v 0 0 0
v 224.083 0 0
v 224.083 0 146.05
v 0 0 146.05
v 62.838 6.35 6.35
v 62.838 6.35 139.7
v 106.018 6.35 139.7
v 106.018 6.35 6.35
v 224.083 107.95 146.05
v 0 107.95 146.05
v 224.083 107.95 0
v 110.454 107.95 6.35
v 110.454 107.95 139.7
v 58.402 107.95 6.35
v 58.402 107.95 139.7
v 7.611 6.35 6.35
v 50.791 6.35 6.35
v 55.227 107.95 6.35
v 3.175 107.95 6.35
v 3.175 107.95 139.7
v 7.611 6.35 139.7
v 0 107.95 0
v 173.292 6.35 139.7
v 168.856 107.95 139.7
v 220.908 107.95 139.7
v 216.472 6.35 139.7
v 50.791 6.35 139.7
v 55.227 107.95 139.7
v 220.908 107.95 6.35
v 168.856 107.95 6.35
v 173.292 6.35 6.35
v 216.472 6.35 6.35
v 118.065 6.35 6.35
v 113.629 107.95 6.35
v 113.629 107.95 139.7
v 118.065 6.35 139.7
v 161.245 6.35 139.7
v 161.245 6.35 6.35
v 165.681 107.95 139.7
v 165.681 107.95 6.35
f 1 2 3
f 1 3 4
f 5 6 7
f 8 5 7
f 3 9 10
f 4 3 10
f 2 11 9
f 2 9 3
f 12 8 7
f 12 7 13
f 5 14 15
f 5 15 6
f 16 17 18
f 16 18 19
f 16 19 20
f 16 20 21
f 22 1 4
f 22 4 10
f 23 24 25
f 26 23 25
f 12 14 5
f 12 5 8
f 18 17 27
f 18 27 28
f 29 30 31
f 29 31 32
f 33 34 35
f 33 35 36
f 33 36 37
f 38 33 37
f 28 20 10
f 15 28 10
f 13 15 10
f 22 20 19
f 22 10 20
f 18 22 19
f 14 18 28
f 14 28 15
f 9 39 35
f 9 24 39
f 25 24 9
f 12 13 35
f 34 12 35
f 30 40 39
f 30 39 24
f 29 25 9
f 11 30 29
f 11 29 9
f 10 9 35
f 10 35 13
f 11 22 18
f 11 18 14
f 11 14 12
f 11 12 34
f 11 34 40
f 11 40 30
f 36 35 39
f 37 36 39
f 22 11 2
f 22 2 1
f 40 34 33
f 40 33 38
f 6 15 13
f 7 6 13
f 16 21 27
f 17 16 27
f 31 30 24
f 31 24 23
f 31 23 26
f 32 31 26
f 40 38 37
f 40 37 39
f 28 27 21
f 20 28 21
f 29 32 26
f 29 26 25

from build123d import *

# Parameters (mm, degrees)
BOSS_EXTRUDE1_DEPTH = 146.05
BOSS_EXTRUDE2_DEPTH = 6.35


with BuildPart() as part:
    # Sketch1 → Boss-Extrude1 (new body)
    with BuildSketch(Plane.XY):
        Polygon((0, 0), (0, 107.95), (3.175, 107.95), (7.6109518, 6.35), (50.7909518, 6.35), (55.226903599, 107.95), (58.401903599, 107.95), (62.837855399, 6.35), (106.017855399, 6.35), (110.453807198, 107.95), (113.628807198, 107.95), (118.064758998, 6.35), (161.244758998, 6.35), (165.680710797, 107.95), (168.855710797, 107.95), (173.291662597, 6.35), (216.471662597, 6.35), (220.907614396, 107.95), (224.082614396, 107.95), (224.082614396, 0), align=None)
    extrude(amount=BOSS_EXTRUDE1_DEPTH)

    # Sketch2 → Boss-Extrude2 (add)
    with BuildSketch(Plane.XY.offset(146.05)):
        Polygon((3.175, 107.95), (55.226903599, 107.95), (50.7909518, 6.35), (7.6109518, 6.35), align=None)
        Polygon((58.401903599, 107.95), (62.837855399, 6.35), (106.017855399, 6.35), (110.453807198, 107.95), align=None)
        Polygon((113.628807198, 107.95), (118.064758998, 6.35), (161.244758998, 6.35), (165.680710797, 107.95), align=None)
        Polygon((168.855710797, 107.95), (173.291662597, 6.35), (216.471662597, 6.35), (220.907614396, 107.95), align=None)
    boss_extrude2 = extrude(amount=-BOSS_EXTRUDE2_DEPTH)

    # Mirror1: Boss-Extrude2 across plane
    add(boss_extrude2.mirror(Plane(origin=(0, 0, 73.025), x_dir=(1, 0, 0), z_dir=(0, 0, -1))))


solid = part.part
